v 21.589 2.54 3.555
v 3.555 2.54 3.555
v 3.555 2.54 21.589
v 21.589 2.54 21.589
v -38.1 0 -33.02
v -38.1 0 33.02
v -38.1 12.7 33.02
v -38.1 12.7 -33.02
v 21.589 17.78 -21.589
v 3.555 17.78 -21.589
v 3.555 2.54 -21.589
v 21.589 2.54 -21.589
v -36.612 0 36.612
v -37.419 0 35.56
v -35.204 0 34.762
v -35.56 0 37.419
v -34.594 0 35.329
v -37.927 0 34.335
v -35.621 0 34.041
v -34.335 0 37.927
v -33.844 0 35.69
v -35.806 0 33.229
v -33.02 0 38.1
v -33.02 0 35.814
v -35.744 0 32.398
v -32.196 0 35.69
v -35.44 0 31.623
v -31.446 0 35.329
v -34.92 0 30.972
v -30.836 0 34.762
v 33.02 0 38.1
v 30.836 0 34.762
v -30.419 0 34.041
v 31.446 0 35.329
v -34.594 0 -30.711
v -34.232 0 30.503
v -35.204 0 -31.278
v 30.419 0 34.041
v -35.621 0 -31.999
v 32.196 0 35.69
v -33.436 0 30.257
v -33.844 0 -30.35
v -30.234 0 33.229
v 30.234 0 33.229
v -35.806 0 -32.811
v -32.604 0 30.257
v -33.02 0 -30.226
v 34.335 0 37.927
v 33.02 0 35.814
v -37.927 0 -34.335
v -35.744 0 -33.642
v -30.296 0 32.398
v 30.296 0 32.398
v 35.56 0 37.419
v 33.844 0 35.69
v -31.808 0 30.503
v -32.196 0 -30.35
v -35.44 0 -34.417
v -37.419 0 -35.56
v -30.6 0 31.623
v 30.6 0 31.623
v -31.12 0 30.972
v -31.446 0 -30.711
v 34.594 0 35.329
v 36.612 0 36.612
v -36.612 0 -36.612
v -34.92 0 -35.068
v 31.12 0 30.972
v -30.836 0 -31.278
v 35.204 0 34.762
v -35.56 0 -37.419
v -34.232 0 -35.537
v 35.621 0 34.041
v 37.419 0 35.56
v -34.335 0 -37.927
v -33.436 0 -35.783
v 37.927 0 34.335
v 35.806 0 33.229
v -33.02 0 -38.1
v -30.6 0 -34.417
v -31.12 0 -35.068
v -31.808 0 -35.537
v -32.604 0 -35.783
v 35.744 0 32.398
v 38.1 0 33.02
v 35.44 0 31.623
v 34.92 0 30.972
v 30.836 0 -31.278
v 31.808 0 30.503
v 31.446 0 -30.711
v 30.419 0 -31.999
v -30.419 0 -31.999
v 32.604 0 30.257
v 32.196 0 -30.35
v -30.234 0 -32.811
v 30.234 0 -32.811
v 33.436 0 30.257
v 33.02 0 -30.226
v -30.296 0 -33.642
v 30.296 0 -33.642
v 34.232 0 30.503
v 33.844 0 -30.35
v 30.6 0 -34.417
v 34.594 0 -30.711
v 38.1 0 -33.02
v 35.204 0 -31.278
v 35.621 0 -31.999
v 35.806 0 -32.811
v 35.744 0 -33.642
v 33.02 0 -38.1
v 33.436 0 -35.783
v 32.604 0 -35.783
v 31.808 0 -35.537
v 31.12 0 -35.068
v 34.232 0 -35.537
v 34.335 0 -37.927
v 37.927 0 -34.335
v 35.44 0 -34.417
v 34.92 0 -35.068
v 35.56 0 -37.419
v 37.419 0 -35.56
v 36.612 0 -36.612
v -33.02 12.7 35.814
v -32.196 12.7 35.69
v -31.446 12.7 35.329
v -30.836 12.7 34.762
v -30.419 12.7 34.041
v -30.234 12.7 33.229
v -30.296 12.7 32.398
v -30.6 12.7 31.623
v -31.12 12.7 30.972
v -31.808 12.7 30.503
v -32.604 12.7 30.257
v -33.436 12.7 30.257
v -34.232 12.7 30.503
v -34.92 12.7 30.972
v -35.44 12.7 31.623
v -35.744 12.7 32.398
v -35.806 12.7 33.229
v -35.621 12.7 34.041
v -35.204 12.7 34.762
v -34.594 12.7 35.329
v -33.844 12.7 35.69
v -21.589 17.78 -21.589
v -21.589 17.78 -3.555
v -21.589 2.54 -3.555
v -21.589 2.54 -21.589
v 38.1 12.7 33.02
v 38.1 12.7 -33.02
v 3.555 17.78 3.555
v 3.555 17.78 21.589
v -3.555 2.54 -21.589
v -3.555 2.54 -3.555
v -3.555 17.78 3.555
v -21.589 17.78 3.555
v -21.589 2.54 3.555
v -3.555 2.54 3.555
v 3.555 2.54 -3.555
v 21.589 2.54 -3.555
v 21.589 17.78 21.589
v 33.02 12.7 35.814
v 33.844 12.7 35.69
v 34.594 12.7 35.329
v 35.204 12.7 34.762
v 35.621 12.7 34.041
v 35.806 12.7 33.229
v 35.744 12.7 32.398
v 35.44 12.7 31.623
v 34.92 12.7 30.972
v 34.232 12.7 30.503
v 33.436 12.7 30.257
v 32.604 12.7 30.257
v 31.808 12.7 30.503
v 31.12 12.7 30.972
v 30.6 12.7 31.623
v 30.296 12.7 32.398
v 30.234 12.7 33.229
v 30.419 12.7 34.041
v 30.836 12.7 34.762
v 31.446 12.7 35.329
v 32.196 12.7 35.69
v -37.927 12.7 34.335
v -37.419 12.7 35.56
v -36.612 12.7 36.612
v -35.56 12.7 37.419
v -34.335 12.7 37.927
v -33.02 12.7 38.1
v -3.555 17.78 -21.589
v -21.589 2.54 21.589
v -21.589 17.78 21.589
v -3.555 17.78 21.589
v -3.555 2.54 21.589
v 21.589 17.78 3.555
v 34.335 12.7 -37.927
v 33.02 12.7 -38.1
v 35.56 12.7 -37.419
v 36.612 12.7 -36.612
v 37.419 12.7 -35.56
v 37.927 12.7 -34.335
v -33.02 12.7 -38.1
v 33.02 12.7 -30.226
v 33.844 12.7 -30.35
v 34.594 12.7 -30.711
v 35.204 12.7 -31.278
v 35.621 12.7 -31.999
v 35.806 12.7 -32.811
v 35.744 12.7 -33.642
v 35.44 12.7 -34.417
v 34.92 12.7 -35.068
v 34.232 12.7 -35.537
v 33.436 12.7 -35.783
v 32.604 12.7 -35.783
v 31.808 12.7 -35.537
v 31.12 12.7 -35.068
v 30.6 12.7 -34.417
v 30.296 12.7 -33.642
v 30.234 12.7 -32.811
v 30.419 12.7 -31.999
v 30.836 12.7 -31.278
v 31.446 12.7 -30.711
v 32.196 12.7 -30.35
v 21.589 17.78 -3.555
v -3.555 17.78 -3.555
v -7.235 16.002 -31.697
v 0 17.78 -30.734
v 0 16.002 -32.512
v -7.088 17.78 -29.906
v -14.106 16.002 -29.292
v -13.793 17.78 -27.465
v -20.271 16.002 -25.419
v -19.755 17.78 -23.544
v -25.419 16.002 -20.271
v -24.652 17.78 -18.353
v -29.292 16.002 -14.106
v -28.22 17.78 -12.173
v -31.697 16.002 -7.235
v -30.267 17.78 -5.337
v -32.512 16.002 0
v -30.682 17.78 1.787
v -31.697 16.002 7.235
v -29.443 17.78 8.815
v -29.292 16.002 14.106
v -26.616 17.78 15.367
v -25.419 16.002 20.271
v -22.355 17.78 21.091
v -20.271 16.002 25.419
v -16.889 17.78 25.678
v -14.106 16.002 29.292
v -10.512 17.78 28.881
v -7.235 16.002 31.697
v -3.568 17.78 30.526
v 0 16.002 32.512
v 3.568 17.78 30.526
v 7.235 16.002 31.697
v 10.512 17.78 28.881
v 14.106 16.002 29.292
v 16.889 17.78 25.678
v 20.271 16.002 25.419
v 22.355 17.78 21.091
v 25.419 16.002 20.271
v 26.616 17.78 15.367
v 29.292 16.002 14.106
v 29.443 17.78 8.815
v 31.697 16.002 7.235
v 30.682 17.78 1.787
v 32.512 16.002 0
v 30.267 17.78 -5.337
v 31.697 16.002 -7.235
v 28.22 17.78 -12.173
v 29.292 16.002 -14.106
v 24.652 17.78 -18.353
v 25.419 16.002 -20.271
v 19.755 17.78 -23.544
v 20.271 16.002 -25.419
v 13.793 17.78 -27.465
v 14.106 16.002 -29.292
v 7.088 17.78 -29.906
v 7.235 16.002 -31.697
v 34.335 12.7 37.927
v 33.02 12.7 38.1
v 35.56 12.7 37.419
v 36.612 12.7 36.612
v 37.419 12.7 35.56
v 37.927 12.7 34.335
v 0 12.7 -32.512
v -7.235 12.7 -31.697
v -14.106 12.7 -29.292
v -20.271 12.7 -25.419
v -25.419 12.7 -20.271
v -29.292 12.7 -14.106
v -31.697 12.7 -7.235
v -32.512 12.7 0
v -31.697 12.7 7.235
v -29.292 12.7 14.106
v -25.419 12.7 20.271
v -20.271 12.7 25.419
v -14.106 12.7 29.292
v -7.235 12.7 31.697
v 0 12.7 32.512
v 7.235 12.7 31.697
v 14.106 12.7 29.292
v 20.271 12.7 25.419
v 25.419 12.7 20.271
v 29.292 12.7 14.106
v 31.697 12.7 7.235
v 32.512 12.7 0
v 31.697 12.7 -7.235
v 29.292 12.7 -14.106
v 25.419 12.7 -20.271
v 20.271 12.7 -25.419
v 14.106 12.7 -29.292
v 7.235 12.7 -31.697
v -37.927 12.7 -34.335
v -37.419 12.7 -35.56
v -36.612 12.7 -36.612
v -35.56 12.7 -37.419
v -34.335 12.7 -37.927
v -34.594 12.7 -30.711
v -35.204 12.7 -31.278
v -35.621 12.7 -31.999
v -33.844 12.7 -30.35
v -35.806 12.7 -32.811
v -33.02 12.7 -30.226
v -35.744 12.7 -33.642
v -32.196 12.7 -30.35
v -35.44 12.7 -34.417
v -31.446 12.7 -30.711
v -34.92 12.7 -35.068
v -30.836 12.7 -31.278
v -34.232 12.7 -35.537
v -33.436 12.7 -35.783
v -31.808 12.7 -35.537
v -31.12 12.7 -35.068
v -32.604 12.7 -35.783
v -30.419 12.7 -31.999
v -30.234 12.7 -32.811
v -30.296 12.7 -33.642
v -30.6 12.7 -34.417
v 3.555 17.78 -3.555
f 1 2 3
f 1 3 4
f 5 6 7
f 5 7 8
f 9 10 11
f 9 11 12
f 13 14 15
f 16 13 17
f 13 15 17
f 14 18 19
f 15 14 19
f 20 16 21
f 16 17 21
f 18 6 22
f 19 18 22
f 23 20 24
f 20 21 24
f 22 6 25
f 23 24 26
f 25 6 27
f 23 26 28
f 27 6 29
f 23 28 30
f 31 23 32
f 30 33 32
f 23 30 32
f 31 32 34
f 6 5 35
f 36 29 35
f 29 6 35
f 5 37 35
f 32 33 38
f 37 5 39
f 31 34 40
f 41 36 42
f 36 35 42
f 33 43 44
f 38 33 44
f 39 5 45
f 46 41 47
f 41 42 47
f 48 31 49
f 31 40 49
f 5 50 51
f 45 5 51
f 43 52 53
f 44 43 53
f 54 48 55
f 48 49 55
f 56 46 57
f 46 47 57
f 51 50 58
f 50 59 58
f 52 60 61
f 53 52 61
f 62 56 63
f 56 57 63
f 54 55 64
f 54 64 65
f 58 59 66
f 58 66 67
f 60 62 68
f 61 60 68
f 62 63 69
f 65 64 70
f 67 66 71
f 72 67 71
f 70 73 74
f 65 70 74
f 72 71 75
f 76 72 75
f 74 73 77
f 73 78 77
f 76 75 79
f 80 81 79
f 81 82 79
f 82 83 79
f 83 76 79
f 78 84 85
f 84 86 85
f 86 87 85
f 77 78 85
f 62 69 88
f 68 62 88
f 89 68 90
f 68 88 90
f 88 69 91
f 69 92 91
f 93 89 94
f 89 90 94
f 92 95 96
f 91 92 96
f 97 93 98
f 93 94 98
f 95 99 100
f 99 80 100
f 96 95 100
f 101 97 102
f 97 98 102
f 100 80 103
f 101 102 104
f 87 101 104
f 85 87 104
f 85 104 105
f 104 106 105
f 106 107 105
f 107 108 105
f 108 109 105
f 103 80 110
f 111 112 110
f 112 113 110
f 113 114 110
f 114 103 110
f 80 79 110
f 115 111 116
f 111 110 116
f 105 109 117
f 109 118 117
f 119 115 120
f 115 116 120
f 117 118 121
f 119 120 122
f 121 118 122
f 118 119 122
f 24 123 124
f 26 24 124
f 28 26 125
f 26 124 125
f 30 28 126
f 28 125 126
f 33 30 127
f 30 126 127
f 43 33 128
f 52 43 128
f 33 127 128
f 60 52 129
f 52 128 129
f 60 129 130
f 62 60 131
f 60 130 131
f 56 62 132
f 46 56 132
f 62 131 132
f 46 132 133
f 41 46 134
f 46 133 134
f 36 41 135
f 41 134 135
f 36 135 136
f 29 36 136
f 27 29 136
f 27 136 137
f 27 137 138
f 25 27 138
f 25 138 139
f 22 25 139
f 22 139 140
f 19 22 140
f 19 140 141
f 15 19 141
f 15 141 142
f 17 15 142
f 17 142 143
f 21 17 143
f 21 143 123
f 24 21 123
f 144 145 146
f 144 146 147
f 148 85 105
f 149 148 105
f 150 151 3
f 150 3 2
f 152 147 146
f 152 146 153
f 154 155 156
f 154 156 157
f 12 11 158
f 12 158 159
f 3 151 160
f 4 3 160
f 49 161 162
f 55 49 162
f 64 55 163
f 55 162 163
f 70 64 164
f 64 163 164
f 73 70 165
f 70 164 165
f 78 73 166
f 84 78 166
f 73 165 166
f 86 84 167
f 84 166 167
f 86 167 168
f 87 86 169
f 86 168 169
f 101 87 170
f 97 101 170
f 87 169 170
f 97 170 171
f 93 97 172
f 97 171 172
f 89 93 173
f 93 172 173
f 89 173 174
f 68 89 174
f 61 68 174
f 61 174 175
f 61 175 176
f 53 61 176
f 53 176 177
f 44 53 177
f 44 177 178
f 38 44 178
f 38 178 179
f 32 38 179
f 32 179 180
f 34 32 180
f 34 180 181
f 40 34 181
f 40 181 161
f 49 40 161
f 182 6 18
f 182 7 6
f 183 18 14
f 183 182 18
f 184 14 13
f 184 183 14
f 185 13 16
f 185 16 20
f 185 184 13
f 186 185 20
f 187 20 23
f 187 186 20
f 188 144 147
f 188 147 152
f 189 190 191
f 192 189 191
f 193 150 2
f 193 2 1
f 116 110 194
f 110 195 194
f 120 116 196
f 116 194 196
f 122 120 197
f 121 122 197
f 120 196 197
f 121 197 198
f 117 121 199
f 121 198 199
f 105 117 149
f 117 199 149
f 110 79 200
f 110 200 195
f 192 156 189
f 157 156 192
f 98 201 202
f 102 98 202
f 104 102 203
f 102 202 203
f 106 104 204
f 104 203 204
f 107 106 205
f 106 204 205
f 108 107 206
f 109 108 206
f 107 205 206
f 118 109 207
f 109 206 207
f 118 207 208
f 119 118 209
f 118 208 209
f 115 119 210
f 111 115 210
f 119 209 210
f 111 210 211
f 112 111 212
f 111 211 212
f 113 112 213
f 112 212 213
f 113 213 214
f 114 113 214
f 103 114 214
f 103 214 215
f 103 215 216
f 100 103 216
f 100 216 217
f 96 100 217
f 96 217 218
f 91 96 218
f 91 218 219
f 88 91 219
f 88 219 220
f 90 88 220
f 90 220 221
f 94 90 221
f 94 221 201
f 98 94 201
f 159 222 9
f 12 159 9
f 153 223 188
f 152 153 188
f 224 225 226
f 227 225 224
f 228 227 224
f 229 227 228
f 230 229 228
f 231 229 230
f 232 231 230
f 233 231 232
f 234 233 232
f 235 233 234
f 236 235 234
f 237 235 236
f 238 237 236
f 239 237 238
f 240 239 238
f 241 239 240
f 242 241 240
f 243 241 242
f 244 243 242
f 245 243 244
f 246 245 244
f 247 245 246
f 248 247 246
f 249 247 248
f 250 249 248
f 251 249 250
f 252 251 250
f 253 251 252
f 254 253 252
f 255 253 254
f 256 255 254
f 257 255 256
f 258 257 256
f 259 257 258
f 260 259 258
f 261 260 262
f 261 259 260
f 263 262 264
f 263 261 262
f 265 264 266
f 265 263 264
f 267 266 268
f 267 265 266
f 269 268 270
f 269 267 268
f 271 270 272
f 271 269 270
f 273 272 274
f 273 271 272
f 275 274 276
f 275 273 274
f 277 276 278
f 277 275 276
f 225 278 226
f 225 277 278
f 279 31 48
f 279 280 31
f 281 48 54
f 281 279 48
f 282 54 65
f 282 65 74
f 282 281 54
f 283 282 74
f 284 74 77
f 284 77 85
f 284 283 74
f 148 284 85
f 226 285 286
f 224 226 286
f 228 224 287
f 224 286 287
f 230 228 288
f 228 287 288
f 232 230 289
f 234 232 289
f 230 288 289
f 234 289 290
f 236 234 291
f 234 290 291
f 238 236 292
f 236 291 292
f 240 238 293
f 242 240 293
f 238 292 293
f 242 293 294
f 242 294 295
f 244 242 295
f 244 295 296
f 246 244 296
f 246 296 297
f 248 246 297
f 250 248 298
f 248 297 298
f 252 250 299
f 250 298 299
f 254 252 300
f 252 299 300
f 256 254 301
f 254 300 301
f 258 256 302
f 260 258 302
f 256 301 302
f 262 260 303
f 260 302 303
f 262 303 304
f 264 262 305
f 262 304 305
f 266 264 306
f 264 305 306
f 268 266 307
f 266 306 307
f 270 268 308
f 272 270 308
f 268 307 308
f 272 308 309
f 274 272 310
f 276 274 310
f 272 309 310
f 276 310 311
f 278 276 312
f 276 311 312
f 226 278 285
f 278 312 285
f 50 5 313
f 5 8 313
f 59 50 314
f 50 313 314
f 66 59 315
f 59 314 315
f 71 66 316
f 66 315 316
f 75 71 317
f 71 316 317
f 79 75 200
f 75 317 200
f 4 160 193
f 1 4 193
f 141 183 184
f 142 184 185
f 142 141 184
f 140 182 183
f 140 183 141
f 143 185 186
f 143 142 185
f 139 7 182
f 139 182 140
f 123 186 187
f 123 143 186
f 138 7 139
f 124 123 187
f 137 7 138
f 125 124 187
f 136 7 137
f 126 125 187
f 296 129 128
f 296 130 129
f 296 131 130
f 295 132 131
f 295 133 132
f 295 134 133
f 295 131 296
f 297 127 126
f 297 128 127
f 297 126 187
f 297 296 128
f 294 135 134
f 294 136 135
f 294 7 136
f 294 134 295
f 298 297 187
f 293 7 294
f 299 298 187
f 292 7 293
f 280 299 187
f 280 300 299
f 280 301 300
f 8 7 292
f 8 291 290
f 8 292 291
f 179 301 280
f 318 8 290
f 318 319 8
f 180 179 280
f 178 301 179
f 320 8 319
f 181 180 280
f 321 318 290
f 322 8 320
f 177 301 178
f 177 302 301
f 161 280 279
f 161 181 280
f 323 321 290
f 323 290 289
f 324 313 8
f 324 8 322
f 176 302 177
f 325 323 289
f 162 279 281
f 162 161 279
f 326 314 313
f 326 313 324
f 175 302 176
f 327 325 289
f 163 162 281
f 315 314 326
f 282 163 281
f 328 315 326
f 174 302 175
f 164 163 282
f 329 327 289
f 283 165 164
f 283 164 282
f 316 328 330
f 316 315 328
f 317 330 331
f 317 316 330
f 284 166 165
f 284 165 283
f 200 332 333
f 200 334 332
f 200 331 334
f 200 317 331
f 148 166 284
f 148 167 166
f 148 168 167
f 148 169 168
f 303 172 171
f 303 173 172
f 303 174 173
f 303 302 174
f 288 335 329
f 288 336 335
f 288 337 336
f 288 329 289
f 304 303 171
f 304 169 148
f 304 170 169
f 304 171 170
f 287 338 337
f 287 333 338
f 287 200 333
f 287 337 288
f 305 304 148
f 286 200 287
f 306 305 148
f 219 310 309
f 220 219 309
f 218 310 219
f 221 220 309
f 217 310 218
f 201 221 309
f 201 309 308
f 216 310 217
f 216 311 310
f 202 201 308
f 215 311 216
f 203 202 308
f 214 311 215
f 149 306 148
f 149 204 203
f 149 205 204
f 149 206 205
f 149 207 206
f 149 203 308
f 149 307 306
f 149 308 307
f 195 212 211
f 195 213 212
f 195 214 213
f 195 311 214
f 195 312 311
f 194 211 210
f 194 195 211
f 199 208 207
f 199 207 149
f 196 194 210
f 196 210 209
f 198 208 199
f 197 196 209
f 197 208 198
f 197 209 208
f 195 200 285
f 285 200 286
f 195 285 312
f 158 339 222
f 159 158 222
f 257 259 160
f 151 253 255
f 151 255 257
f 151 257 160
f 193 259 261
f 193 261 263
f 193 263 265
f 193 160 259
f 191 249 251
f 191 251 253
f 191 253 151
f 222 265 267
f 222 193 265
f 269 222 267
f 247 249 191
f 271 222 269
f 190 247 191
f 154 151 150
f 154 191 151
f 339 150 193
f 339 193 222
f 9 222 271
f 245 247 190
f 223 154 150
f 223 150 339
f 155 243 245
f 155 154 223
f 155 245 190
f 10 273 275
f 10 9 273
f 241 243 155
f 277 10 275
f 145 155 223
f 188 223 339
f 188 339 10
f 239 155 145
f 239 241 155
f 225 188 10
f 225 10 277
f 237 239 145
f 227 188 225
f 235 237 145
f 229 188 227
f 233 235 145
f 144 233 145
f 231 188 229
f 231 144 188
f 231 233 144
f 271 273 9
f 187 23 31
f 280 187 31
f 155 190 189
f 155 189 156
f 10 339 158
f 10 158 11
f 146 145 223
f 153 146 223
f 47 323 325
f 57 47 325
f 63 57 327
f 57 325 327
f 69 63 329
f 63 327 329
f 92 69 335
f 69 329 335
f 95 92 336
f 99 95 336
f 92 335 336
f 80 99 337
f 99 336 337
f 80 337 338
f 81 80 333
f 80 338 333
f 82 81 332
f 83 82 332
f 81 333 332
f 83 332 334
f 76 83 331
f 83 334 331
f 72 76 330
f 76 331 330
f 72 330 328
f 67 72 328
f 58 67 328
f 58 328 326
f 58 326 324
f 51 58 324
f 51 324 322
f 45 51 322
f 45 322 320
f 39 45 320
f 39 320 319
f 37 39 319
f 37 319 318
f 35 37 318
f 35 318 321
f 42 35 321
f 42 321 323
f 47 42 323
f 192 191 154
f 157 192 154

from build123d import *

# Parameters (mm, degrees)
SKETCH1_W           = 76.2
SKETCH1_H           = 76.2
BOSS_EXTRUDE1_DEPTH = 12.7
SKETCH2_R           = 2.794
CUT_EXTRUDE1_DEPTH  = 56.358016583
SKETCH2_3_R         = 32.512
BOSS_EXTRUDE2_DEPTH = 5.08
SKETCH5_W           = 18.034
SKETCH5_H           = 18.034
CUT_EXTRUDE2_DEPTH  = 15.24
FILLET1_R           = 5.08
CHAMFER1_SIZE       = 1.778


with BuildPart() as part:
    # Sketch1 → Boss-Extrude1 (new body)
    with BuildSketch(Plane(origin=(0, 0, 0), x_dir=(1, 0, 0), z_dir=(0, 1, 0))):
        Rectangle(SKETCH1_W, SKETCH1_H)
    extrude(amount=BOSS_EXTRUDE1_DEPTH)

    # Sketch2 → Cut-Extrude1 (cut, through all)
    with BuildSketch(Plane(origin=(0, 12.7, 0), x_dir=(1, 0, 0), z_dir=(0, 1, 0))):
        with Locations((33.02, 33.02)):
            Circle(SKETCH2_R)
        with Locations((33.02, -33.02)):
            Circle(SKETCH2_R)
        with Locations((-33.02, -33.02)):
            Circle(SKETCH2_R)
        with Locations((-33.02, 33.02)):
            Circle(SKETCH2_R)
    extrude(amount=-CUT_EXTRUDE1_DEPTH, mode=Mode.SUBTRACT)

    # Sketch2<3> → Boss-Extrude2 (add)
    with BuildSketch(Plane(origin=(0, 12.7, 0), x_dir=(1, 0, 0), z_dir=(0, 1, 0))):
        Circle(SKETCH2_3_R)
    extrude(amount=BOSS_EXTRUDE2_DEPTH)

    # Sketch5 → Cut-Extrude2 (cut)
    with BuildSketch(Plane(origin=(0, 17.78, 0), x_dir=(1, 0, 0), z_dir=(0, 1, 0))):
        with Locations((-12.572358569, 12.572358569)):
            Rectangle(SKETCH5_W, SKETCH5_H)
        with Locations((12.572358569, 12.572358569)):
            Rectangle(SKETCH5_W, SKETCH5_H)
        with Locations((12.572358569, -12.572358569)):
            Rectangle(SKETCH5_W, SKETCH5_H)
        with Locations((-12.572358569, -12.572358569)):
            Rectangle(SKETCH5_W, SKETCH5_H)
    extrude(amount=-CUT_EXTRUDE2_DEPTH, mode=Mode.SUBTRACT)

    # Fillet1
    fillet1_edges = [part.edges().sort_by_distance(p)[0] for p in [
        (-38.1, 6.35, 38.1),
        (38.1, 6.35, 38.1),
        (38.1, 6.35, -38.1),
        (-38.1, 6.35, -38.1),
    ]]
    fillet(fillet1_edges, radius=FILLET1_R)

    # Chamfer1
    chamfer1_edges = [part.edges().sort_by_distance(p)[0] for p in [
        (-32.512, 17.78, 0),
    ]]
    chamfer(chamfer1_edges, length=CHAMFER1_SIZE)


solid = part.part
